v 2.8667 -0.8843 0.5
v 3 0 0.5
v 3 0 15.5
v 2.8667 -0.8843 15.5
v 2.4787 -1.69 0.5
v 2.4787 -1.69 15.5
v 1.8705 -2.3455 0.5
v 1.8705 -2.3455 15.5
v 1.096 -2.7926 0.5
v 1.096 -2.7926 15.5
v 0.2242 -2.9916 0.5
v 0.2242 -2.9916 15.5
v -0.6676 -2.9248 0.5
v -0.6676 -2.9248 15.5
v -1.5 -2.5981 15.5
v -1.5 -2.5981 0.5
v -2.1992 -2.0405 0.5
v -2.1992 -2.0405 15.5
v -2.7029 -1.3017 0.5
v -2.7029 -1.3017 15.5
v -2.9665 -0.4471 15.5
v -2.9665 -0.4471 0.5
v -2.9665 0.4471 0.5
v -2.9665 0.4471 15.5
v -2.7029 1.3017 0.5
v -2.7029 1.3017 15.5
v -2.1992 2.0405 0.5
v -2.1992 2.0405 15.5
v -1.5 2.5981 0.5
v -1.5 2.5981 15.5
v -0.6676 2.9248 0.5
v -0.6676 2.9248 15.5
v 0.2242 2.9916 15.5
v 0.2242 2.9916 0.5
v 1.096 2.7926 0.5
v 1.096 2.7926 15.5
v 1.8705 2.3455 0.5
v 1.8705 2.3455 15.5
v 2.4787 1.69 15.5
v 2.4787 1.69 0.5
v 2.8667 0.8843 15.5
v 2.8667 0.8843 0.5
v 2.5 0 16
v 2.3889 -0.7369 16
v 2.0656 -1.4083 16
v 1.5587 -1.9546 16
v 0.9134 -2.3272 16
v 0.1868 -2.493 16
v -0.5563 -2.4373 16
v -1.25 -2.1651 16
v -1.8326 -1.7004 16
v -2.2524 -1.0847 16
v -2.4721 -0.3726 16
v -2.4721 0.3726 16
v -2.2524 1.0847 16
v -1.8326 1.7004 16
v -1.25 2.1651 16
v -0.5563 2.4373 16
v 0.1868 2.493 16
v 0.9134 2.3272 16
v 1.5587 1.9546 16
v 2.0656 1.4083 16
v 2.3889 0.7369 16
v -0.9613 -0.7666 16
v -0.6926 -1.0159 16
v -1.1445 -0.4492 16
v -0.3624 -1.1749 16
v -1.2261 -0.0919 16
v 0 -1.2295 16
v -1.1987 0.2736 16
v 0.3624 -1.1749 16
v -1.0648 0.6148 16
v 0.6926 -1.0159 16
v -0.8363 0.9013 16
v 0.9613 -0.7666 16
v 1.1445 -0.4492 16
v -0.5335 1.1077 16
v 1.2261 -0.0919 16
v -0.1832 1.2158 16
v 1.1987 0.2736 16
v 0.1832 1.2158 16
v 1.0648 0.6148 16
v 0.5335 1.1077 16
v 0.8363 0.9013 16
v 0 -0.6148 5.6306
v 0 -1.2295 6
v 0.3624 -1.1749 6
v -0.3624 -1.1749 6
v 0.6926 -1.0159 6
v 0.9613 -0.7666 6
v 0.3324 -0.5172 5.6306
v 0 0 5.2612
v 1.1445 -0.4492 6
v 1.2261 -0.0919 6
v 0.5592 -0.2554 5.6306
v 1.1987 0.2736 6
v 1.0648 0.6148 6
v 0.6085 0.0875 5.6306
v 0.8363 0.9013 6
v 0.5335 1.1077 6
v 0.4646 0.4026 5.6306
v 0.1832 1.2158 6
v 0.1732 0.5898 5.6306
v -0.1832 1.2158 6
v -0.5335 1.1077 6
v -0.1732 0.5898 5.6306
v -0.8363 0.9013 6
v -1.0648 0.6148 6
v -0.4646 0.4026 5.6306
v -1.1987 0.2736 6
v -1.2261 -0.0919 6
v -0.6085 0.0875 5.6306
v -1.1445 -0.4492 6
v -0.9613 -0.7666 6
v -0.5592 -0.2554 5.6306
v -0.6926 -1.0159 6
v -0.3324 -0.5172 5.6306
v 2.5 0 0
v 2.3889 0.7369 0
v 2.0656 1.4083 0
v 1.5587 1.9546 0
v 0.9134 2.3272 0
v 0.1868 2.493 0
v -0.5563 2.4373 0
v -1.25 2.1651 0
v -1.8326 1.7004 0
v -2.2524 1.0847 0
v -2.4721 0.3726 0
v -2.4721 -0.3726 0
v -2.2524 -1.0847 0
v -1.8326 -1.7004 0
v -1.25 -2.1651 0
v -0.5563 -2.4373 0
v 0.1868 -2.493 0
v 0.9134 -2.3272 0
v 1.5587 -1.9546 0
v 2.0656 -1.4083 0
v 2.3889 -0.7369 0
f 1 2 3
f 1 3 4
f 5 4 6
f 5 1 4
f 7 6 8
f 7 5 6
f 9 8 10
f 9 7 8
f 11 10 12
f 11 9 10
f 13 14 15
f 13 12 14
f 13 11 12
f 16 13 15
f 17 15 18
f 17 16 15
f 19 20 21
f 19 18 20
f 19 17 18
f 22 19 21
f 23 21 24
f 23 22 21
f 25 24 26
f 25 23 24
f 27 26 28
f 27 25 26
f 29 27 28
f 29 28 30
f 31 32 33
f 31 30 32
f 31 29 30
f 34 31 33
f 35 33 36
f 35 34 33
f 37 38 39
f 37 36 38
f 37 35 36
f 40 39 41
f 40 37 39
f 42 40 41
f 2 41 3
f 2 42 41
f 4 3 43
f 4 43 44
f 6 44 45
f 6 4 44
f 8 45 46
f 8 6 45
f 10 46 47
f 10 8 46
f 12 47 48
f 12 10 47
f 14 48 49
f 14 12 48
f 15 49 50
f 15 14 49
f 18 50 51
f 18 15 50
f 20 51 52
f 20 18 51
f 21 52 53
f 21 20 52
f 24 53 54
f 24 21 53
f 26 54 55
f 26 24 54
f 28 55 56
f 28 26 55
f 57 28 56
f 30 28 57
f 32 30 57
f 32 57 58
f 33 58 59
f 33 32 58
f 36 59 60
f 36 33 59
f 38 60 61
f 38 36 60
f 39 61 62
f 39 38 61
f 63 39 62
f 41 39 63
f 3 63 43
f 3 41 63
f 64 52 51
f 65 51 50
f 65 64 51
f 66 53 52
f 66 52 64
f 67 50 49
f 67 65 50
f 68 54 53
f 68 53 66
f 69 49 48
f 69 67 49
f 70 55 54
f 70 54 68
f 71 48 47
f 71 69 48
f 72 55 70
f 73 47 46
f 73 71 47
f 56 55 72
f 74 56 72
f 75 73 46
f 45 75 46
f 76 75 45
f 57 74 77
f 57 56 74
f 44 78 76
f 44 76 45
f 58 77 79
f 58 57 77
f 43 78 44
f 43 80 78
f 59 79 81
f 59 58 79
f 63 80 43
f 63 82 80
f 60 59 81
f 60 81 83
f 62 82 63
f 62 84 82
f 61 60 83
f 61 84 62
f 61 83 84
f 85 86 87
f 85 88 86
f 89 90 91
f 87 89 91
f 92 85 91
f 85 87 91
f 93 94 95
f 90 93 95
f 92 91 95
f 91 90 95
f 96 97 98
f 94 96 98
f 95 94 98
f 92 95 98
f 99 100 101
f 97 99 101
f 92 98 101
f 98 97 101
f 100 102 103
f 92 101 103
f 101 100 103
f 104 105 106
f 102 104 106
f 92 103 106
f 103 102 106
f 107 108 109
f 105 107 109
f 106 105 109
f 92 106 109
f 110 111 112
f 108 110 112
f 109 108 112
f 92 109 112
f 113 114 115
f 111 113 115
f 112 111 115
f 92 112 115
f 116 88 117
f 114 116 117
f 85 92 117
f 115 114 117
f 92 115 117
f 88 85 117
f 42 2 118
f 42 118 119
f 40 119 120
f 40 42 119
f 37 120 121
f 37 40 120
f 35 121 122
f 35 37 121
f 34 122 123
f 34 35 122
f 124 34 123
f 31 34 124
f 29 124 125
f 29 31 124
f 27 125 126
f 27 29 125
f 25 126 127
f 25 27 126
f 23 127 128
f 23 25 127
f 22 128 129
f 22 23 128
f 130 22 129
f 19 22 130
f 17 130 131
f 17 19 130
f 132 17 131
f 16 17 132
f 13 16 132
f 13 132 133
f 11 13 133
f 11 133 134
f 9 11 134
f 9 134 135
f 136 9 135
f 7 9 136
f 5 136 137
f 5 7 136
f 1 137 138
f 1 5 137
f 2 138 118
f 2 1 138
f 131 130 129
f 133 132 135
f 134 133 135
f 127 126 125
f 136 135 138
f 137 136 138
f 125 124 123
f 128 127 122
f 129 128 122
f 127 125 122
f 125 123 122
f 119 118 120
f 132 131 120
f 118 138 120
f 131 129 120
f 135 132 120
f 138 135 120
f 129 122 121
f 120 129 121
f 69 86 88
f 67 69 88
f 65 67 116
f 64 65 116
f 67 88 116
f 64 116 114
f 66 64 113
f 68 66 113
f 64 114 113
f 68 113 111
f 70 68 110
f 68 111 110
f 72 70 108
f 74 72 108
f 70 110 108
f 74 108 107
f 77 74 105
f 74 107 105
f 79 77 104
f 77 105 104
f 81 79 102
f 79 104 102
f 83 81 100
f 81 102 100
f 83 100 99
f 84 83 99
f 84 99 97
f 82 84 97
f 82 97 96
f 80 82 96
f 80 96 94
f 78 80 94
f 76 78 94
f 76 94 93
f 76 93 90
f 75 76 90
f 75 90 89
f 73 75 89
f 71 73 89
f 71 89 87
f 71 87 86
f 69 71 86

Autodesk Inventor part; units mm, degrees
ref_plane "YZ Plane" through (0, 0, 0) normal (1, 0, 0) x (0, 1, 0)
ref_plane "XZ Plane" through (0, 0, 0) normal (0, 1, 0) x (-1, 0, 0)
ref_plane "XY Plane" through (0, 0, 0) normal (0, 0, 1) x (1, 0, 0)
sketch "Skizze1" plane through (0, 0, 0) normal (0, 0, 1) x (1, 0, 0)
  circle A0 centre (0, 0) radius 3
  dimension "d0" = 6
extrude "Extrusion1" add sketch "Skizze1" along normal blind 16
chamfer "Fase1" distance 0.5 angle 45 2 edges at (-3, 0, 16) (-3, 0, 0)
sketch "Skizze2" plane through (0, 0, 16) normal (0, 0, 1) x (1, 0, 0)
  circle A0 centre (0, 0) radius 2.5 projected
hole "Bohrung1" at (0, 0, 16) direction (0, 0, -1) diameter 2.459 depth 10 tip angle 118 thread size "M3x0.5" class "6H" standard "ISO Metric profile"
properties part number "13_0204_021"
